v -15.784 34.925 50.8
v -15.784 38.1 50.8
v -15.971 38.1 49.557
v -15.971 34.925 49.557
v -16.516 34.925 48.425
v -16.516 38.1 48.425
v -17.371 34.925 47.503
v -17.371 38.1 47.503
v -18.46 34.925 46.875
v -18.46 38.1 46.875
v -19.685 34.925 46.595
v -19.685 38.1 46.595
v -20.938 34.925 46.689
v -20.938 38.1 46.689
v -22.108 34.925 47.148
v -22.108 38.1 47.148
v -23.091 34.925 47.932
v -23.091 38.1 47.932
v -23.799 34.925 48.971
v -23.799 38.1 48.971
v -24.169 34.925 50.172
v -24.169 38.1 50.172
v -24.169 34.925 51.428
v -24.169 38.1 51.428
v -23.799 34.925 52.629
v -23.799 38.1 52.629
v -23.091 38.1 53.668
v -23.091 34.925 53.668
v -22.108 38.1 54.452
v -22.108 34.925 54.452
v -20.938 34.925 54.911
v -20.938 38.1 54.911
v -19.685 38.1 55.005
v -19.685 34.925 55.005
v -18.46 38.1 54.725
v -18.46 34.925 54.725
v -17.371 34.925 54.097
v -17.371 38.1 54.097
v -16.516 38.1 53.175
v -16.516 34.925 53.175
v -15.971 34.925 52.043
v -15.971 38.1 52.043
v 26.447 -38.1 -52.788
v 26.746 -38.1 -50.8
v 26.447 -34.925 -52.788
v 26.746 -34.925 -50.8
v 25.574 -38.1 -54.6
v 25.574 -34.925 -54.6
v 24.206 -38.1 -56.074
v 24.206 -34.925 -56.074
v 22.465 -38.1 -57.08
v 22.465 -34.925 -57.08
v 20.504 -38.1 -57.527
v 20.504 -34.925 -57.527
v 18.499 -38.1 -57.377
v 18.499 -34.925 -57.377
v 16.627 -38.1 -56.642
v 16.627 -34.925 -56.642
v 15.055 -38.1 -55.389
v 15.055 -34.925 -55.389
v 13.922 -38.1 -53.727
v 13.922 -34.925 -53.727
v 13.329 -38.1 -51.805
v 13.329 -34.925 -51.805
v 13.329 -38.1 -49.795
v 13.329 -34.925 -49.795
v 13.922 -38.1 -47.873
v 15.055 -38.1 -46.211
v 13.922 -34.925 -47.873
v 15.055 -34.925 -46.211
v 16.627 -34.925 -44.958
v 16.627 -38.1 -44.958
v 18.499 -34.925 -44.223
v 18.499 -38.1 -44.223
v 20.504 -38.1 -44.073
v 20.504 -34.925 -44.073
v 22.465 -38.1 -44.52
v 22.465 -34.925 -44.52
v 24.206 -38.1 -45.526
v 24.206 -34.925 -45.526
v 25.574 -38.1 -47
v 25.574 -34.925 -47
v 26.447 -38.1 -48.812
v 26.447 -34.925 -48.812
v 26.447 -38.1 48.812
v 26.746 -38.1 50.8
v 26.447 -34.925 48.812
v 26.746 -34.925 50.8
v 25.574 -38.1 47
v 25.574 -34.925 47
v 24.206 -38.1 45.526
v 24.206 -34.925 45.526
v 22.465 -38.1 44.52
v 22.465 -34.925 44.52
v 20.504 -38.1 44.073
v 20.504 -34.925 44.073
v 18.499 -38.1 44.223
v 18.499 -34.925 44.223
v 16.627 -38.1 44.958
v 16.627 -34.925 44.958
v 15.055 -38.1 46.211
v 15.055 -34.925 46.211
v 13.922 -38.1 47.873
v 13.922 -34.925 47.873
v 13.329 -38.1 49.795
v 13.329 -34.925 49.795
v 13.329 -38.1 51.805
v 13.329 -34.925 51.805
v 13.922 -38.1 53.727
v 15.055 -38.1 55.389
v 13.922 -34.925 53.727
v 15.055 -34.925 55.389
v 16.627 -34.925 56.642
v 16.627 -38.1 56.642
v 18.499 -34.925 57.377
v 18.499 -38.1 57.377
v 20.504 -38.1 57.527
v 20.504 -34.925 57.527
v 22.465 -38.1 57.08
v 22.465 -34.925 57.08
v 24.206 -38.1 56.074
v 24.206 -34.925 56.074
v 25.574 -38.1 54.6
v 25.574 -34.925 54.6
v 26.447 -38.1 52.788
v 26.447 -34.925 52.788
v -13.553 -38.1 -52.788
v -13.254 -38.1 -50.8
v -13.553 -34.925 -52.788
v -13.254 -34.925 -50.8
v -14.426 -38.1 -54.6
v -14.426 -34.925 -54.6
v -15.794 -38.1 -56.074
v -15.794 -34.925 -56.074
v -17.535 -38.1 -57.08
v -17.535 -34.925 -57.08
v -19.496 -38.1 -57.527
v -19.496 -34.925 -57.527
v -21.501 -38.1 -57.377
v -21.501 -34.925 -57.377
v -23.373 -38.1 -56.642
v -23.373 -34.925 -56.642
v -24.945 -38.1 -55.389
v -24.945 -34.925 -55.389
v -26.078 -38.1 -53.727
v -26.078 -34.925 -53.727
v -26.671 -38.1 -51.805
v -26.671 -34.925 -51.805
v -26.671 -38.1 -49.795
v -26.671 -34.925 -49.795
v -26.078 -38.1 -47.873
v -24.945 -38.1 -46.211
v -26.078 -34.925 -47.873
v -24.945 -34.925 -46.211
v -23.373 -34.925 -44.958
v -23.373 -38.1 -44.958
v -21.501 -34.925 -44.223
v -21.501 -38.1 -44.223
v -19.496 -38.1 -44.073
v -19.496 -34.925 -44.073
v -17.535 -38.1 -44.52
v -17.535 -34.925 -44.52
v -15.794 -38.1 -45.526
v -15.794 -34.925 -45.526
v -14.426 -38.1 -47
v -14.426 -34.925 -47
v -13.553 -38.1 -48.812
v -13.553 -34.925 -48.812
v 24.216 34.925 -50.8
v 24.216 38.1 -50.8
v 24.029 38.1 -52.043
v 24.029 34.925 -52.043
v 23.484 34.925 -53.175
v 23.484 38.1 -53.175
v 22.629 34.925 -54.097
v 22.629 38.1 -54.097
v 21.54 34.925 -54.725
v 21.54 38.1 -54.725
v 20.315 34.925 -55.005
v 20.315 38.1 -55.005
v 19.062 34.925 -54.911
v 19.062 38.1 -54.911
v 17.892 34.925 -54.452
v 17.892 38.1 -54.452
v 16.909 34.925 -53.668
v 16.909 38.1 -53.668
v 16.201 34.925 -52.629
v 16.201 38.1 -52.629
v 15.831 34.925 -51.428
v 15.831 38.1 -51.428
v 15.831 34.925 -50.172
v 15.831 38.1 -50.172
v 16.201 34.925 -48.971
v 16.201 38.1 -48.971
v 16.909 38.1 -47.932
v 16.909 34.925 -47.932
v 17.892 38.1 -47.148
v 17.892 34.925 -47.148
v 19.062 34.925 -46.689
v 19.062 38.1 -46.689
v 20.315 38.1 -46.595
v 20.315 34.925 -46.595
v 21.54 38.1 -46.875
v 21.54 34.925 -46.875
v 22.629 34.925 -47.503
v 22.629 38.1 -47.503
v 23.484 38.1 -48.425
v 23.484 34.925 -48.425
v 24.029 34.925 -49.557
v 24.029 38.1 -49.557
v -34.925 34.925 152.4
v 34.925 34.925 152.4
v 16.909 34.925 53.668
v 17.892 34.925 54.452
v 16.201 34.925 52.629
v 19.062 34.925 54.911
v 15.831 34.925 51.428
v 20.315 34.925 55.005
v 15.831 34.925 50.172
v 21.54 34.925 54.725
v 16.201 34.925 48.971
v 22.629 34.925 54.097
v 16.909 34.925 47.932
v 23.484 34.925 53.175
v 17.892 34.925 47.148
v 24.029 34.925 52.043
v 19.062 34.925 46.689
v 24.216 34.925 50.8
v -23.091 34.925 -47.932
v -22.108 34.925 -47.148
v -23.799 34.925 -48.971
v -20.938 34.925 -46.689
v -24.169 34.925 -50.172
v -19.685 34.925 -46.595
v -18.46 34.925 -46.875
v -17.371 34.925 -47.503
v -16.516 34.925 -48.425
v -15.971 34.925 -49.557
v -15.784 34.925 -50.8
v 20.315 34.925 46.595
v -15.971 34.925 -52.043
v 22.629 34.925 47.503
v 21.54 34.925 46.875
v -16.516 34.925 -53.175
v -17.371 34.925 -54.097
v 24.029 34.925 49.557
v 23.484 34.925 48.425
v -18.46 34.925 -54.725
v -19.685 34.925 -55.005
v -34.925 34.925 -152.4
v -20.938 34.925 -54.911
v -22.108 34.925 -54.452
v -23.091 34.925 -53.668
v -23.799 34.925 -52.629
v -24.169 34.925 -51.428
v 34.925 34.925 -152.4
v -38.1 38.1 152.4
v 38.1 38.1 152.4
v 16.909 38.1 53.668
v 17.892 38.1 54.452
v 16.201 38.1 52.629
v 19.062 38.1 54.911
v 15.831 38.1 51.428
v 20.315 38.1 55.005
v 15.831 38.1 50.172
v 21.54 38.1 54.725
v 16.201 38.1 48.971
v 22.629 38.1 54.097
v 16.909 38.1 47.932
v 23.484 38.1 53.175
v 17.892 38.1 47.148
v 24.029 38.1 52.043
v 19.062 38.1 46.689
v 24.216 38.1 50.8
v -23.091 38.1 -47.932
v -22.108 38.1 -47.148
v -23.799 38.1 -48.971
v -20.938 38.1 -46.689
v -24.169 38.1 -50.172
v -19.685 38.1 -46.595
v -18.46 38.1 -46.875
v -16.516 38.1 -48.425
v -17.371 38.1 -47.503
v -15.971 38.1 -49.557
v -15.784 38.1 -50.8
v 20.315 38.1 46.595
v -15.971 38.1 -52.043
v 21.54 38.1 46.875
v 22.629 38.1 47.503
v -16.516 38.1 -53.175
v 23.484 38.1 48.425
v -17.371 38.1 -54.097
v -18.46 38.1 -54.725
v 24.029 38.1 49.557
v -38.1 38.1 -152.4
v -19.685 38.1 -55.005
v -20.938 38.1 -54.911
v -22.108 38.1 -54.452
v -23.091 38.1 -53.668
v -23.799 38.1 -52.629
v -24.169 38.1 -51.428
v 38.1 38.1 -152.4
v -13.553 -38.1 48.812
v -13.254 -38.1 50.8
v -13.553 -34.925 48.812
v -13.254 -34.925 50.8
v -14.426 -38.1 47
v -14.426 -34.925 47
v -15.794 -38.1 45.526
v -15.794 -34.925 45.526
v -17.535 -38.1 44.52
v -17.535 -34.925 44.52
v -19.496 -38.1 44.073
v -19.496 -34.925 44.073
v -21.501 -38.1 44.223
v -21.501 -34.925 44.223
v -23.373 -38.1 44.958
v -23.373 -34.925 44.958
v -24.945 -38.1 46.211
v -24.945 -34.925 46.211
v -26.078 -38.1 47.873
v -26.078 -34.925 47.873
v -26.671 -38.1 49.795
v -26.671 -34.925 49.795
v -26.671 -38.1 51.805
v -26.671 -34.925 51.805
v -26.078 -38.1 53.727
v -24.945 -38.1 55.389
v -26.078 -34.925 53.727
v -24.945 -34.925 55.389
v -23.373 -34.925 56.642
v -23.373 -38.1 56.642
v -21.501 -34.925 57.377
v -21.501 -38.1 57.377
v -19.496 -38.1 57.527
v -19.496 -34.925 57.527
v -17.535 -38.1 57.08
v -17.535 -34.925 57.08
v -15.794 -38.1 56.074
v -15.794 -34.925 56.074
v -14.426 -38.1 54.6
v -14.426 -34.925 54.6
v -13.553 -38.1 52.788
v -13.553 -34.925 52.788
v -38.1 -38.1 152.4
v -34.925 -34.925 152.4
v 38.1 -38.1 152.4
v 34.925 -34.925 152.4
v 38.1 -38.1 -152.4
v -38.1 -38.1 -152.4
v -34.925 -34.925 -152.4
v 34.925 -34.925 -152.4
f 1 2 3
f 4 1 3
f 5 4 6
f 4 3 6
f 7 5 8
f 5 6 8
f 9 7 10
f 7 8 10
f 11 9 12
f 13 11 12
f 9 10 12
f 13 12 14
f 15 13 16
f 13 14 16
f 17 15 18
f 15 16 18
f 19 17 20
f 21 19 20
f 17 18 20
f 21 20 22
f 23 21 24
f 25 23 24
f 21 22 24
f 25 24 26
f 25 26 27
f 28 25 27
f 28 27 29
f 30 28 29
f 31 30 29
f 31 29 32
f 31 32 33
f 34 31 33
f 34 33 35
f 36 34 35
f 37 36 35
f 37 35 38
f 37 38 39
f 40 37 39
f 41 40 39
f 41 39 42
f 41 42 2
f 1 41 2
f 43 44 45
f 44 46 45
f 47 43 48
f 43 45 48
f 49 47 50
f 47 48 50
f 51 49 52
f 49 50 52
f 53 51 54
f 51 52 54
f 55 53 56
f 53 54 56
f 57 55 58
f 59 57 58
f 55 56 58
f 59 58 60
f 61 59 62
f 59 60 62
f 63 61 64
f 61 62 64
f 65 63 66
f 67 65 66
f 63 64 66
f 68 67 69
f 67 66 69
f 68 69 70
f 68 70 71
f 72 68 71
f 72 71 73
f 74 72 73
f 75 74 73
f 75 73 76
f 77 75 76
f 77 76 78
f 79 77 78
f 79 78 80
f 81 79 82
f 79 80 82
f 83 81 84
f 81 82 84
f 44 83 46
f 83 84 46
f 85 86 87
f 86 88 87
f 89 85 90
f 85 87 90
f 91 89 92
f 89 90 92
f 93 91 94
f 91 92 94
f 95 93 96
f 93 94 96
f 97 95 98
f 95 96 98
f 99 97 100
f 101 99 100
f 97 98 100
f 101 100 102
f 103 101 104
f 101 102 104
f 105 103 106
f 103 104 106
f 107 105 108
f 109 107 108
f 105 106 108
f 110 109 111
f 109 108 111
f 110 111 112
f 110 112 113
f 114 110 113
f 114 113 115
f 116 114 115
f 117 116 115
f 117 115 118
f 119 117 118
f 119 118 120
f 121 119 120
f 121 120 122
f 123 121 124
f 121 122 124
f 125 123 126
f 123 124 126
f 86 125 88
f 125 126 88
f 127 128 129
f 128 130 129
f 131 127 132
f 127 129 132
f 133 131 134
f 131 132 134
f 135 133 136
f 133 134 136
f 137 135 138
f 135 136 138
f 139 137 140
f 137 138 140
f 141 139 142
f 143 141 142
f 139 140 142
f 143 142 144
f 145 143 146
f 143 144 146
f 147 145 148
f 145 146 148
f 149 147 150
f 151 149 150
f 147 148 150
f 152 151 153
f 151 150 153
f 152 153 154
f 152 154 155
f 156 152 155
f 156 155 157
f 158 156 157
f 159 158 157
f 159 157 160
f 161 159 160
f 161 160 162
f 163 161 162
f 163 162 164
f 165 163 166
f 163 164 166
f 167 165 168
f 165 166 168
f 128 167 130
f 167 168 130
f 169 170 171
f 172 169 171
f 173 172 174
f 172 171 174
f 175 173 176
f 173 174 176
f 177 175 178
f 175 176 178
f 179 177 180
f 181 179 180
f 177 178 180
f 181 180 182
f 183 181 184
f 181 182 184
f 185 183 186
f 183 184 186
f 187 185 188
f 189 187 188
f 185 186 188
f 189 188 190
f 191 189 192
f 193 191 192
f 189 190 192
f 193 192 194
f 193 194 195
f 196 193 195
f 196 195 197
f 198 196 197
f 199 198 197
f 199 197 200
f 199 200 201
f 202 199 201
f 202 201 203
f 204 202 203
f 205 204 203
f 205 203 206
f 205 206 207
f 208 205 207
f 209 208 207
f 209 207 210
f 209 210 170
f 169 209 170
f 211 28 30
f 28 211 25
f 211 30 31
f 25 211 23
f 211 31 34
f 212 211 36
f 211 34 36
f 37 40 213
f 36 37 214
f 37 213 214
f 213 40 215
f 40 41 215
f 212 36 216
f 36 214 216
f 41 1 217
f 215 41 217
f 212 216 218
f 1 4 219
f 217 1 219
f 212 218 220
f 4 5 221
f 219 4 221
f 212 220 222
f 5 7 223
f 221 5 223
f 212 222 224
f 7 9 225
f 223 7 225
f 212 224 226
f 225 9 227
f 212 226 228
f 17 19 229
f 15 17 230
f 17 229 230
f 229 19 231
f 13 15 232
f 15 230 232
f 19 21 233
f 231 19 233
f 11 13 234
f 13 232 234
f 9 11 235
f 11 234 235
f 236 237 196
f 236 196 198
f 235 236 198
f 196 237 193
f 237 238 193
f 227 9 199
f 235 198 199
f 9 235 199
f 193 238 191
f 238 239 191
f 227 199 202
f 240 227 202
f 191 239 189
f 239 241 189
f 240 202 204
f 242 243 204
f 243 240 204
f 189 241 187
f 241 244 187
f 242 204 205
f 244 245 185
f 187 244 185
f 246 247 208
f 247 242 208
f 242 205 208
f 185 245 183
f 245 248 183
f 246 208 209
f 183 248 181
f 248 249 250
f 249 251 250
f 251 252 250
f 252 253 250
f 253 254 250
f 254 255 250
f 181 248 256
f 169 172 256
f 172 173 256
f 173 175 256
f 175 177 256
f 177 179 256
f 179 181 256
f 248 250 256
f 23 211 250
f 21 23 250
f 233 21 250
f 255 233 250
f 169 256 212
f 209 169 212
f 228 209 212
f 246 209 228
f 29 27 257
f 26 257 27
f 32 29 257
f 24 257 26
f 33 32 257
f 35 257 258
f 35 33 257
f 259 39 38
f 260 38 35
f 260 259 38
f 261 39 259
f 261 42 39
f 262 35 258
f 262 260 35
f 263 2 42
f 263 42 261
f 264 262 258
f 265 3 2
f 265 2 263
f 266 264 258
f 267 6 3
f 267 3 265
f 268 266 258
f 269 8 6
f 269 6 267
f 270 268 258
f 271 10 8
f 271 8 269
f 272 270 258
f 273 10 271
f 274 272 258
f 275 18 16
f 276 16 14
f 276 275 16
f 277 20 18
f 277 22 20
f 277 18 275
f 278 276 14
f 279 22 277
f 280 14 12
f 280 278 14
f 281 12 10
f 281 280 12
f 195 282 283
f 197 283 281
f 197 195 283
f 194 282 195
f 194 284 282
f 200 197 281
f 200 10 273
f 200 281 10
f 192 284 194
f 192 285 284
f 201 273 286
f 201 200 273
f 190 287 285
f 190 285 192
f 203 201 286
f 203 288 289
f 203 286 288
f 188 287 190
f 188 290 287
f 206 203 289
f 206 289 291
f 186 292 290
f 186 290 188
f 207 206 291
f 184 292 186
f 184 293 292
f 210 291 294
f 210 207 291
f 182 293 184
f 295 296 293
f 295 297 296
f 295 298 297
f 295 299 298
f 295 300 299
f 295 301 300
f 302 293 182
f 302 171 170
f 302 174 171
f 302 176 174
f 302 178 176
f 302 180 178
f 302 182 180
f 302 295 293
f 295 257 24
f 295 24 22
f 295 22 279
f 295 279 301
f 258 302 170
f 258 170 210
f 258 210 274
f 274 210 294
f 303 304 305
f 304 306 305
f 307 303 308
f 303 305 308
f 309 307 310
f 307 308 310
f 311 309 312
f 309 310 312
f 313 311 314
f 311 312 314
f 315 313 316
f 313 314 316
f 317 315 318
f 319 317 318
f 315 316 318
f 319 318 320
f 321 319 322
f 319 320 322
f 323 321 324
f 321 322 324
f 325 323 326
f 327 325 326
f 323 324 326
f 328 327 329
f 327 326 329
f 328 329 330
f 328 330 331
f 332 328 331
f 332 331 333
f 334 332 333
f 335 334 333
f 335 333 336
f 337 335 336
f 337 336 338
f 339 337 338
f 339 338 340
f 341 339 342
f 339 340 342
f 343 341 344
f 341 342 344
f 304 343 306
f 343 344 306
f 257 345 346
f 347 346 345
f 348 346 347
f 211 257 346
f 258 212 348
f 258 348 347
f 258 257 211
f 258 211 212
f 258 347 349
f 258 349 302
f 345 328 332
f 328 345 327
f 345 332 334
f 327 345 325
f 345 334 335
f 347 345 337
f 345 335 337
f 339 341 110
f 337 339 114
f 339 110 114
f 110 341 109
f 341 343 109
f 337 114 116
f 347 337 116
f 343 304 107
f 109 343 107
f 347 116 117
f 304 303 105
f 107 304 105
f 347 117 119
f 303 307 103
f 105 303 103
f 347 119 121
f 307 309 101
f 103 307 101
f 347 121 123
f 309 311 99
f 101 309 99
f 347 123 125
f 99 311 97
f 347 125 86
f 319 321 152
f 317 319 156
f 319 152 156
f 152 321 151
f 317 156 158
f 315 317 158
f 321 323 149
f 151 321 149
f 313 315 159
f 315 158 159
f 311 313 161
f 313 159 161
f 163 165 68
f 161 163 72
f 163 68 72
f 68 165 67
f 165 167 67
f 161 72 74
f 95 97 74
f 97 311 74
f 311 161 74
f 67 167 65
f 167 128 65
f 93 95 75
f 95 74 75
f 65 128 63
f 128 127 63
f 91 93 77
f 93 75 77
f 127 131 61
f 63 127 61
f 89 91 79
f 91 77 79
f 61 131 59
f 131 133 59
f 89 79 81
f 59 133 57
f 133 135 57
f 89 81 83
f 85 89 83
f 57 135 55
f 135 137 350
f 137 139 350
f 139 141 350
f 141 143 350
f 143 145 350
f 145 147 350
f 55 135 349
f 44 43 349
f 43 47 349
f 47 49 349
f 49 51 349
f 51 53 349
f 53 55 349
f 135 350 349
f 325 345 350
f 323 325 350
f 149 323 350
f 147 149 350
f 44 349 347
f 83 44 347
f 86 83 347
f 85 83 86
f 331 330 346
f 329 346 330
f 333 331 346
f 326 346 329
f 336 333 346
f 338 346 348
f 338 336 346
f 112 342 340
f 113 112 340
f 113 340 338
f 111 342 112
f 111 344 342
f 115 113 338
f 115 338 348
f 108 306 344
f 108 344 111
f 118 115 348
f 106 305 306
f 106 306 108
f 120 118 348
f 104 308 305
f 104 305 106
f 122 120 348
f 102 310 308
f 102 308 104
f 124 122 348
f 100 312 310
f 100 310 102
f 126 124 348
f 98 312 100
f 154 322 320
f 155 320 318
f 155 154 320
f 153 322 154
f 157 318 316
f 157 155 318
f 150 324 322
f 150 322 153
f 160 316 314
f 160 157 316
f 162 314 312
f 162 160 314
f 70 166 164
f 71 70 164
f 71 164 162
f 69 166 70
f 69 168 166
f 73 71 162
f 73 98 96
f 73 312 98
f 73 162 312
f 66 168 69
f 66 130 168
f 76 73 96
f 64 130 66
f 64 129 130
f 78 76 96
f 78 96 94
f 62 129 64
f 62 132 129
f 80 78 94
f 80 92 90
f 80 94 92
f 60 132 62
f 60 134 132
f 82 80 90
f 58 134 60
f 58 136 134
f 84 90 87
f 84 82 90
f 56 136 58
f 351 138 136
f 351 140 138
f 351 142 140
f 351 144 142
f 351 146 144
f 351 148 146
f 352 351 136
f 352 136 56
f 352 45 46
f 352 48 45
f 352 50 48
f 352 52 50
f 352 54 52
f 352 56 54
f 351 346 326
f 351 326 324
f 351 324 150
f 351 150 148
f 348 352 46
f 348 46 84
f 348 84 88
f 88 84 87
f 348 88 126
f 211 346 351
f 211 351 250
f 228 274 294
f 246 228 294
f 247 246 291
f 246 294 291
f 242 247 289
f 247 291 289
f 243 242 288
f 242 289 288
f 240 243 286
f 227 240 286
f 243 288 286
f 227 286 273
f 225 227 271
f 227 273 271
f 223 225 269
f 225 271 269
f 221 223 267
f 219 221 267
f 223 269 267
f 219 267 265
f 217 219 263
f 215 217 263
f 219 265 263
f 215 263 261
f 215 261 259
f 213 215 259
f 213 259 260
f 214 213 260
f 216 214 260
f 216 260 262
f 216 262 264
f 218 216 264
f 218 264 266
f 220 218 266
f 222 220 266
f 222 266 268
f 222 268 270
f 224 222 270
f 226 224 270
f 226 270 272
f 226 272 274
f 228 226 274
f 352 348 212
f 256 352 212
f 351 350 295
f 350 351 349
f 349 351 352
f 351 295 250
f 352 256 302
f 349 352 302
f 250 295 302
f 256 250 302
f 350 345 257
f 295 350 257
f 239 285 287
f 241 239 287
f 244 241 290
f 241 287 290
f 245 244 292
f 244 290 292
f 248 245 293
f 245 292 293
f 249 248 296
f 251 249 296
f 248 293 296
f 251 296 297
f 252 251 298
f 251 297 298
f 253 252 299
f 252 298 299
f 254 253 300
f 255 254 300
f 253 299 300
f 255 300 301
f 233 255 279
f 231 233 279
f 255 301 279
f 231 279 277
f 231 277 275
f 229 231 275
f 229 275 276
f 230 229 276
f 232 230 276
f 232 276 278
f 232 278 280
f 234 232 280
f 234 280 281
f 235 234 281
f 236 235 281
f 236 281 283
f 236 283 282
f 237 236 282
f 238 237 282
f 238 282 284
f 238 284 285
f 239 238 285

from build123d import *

# Parameters (mm, degrees)
BOSS_EXTRUDE1_DEPTH         = 152.4
BOSS_EXTRUDE1_DEPTH_BACK    = 152.4
SKETCH3_W                   = 76.2
SKETCH3_H                   = 76.2
SKETCH3_W_2                 = 69.85
SKETCH3_H_2                 = 69.85
F_5_16_CLEARANCE_HOLE3_D    = 8.4328
F_1_2_CLEARANCE_HOLE1_D     = 13.49248
F_1_2_CLEARANCE_HOLE1_DEPTH = 3.175
F_1_2_CLEARANCE_HOLE1_TIP   = 4.053549943


with BuildPart() as part:
    # Sketch3 → Boss-Extrude1 (new, two sides: drawn at the far end of the back side and taken through both)
    with BuildSketch(Plane.XY.offset(-BOSS_EXTRUDE1_DEPTH_BACK)):
        Rectangle(SKETCH3_W, SKETCH3_H)
        Rectangle(SKETCH3_W_2, SKETCH3_H_2, mode=Mode.SUBTRACT)
    extrude(amount=BOSS_EXTRUDE1_DEPTH + BOSS_EXTRUDE1_DEPTH_BACK)

    # 5/16 Clearance Hole3 (through all)
    with Locations(Plane(origin=(0, -38.1, 0), x_dir=(-1, 0, 0), z_dir=(0, -1, 0))):
        with Locations((20, 50.8), (-20, -50.8), (-20, 50.8), (20, -50.8)):
            Hole(F_5_16_CLEARANCE_HOLE3_D / 2)

    # 1/2 Clearance Hole1
    with Locations(Plane(origin=(0, -38.1, 0), x_dir=(-1, 0, 0), z_dir=(0, -1, 0))):
        with Locations((-20, 50.8), (20, 50.8), (-20, -50.8), (20, -50.8)):
            Hole(F_1_2_CLEARANCE_HOLE1_D / 2, depth=F_1_2_CLEARANCE_HOLE1_DEPTH)
            with Locations((0, 0, -(F_1_2_CLEARANCE_HOLE1_DEPTH + F_1_2_CLEARANCE_HOLE1_TIP / 2))):  # 118° drill point
                Cone(0, F_1_2_CLEARANCE_HOLE1_D / 2, F_1_2_CLEARANCE_HOLE1_TIP, mode=Mode.SUBTRACT)


solid = part.part
